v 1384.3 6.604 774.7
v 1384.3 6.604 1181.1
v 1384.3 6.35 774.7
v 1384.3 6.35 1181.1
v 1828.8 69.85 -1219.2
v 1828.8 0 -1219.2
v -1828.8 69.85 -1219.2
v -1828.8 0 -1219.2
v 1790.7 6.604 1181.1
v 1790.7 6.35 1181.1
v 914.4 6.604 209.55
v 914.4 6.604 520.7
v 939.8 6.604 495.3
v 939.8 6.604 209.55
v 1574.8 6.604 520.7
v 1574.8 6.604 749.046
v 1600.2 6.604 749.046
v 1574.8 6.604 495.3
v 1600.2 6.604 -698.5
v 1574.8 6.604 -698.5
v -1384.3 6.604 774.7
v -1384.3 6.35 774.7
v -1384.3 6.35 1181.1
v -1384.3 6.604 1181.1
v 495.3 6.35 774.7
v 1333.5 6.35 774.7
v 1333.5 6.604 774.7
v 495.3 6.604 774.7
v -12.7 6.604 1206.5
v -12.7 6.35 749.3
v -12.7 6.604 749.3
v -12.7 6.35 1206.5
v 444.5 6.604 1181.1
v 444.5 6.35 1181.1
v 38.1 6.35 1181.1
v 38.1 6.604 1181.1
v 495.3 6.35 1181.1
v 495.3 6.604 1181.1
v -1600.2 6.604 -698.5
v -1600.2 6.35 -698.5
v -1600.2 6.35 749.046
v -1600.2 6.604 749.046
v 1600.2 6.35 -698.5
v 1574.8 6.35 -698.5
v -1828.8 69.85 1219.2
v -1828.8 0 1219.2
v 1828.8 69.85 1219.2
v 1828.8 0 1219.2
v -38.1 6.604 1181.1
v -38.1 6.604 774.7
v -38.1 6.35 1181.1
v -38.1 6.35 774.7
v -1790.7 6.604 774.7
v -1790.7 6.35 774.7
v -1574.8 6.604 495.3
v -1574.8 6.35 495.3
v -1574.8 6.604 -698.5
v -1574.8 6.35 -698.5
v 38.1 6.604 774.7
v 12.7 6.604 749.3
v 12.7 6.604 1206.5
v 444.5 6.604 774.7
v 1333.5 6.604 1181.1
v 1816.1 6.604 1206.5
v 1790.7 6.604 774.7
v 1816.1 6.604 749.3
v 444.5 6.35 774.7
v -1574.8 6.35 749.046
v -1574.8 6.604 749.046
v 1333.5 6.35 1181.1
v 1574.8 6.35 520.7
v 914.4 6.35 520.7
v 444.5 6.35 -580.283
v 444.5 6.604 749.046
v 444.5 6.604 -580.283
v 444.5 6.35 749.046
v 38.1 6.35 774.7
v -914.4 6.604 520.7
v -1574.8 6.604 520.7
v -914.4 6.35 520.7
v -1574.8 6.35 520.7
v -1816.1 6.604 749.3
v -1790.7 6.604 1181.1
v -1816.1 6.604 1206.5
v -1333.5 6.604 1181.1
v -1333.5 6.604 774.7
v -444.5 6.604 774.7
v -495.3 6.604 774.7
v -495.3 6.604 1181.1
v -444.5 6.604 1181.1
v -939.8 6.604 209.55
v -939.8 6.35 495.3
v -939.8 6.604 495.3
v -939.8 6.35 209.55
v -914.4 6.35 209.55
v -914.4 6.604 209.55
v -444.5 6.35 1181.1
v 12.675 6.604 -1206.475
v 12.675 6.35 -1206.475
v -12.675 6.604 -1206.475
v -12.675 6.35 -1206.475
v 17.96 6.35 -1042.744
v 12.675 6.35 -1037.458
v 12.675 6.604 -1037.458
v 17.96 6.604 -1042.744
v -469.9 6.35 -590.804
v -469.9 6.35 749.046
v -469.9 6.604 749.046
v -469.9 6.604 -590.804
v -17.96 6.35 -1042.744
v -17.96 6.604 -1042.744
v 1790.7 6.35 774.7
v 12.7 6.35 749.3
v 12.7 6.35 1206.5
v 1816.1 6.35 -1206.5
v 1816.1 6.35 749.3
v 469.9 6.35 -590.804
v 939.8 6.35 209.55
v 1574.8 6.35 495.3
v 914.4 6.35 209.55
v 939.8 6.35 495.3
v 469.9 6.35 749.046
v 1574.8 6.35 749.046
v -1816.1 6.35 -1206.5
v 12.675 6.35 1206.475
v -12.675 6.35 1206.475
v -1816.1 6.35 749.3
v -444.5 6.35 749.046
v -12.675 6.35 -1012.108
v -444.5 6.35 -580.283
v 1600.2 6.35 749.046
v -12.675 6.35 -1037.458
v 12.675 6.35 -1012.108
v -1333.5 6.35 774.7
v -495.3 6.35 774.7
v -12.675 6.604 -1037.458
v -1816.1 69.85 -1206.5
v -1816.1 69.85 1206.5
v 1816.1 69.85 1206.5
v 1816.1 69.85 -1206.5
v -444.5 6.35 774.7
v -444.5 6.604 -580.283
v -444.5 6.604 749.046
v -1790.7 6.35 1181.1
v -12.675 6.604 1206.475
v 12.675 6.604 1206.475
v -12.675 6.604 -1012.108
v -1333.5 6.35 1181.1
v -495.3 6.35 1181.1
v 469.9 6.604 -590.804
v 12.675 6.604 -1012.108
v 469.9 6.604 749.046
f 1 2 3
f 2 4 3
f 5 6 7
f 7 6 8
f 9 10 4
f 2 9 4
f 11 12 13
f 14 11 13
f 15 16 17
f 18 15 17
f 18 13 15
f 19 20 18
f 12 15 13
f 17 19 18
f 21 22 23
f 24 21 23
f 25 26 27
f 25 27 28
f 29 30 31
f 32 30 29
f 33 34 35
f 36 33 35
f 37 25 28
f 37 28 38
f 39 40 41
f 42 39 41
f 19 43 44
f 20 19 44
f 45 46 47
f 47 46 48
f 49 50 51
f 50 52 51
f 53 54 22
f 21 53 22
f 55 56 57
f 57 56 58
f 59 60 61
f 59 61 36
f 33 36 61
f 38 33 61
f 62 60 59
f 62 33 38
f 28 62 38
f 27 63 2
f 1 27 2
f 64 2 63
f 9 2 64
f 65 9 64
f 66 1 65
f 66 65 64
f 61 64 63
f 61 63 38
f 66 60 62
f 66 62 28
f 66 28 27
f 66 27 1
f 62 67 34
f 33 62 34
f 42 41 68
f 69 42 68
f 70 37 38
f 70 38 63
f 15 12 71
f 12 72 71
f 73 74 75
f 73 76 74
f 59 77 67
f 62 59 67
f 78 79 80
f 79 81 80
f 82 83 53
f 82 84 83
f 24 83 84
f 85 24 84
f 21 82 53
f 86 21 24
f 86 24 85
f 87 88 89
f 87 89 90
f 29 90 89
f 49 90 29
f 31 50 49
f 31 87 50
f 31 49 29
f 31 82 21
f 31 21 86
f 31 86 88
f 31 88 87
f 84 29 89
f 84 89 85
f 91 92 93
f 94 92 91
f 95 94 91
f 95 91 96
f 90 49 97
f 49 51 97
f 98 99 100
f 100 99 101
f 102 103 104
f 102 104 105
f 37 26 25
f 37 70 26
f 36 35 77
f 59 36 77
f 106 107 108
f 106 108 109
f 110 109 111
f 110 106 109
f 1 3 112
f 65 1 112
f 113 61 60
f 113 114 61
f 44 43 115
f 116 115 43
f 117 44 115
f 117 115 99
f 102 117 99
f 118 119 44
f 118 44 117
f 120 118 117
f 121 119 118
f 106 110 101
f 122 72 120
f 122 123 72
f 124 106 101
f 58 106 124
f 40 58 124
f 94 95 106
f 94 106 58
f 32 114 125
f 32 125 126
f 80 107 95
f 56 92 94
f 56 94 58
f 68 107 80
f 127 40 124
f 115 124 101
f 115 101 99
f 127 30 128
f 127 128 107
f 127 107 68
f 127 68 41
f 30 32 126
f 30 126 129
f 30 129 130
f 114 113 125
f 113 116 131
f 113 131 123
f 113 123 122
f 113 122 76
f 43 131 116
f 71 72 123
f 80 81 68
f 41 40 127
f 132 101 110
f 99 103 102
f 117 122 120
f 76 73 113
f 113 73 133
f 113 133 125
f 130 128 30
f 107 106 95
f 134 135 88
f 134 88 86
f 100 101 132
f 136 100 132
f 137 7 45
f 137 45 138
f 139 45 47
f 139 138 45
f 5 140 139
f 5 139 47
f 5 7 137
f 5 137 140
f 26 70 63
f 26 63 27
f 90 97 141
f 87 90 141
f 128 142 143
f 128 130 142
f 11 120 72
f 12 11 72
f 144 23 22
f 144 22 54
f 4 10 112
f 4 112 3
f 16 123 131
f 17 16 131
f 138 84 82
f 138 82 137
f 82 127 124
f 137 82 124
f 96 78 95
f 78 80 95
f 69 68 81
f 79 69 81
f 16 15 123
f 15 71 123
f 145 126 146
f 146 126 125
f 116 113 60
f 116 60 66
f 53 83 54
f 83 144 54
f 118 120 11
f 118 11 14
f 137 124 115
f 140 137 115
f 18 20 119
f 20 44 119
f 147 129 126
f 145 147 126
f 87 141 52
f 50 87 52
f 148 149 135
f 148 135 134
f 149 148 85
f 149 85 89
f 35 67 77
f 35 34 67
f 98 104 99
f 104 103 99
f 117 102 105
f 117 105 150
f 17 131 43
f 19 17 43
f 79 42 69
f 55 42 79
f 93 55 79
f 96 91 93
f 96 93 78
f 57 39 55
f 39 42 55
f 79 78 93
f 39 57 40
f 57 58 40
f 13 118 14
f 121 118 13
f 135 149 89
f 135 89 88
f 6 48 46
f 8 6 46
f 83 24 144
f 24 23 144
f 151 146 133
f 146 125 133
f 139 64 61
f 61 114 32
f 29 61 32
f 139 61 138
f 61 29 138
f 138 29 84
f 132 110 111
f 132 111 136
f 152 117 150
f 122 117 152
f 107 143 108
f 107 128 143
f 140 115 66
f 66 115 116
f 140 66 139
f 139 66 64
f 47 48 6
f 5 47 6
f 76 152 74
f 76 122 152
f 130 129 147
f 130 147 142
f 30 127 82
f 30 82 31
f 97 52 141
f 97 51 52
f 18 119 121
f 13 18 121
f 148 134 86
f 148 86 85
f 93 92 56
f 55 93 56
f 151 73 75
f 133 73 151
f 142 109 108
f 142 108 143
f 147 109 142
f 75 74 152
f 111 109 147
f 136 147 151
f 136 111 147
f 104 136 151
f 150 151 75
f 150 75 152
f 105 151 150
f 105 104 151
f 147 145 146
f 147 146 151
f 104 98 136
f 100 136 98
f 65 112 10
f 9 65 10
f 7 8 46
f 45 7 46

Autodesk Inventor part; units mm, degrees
ref_plane "YZ Plane" through (0, 0, 0) normal (1, 0, 0) x (0, 1, 0)
ref_plane "XZ Plane" through (0, 0, 0) normal (0, 1, 0) x (-1, 0, 0)
ref_plane "XY Plane" through (0, 0, 0) normal (0, 0, 1) x (1, 0, 0)
sketch "Sketch1" plane through (0, 0, 0) normal (0, 1, 0) x (-1, 0, 0)
  line L0 (0, -1706.88) -> (0, 1706.88) projected
  line L1 (-2560.32, 0) -> (2560.32, 0) projected
  line L2 (1828.8, 1219.2) -> (-1828.8, 1219.2)
  line L3 (-1828.8, 1219.2) -> (-1828.8, -1219.2)
  line L4 (-1828.8, -1219.2) -> (1828.8, -1219.2)
  line L5 (1828.8, -1219.2) -> (1828.8, 1219.2)
  line L6 (1828.8, 1219.2) -> (-1828.8, -1219.2) construction
  line L7 (-1828.8, 1219.2) -> (1828.8, -1219.2) construction
  point P0 (0, 0)
  dimension "d0" = 2438.4
  dimension "d1" = 3657.6
extrude "Extrusion1" add sketch "Sketch1" along normal blind 6.35
sketch "Sketch2" plane through (0, 6.35, 0) normal (0, 1, 0) x (1, 0, 0)
  line L0 (-1828.8, -1219.2) -> (1828.8, -1219.2) projected
  line L1 (1828.8, -1219.2) -> (1828.8, 1219.2) projected
  line L2 (1828.8, 1219.2) -> (-1828.8, 1219.2) projected
  line L3 (-1828.8, 1219.2) -> (-1828.8, -1219.2) projected
  line L4 (-1816.1, 1206.5) -> (1816.1, 1206.5)
  line L5 (1816.1, 1206.5) -> (1816.1, -1206.5)
  line L6 (1816.1, -1206.5) -> (-1816.1, -1206.5)
  line L7 (-1816.1, -1206.5) -> (-1816.1, 1206.5)
  point P0 (0, 0)
  dimension "d4" = 12.7
extrude "Extrusion2" add sketch "Sketch2" along normal blind 63.5
sketch "Sketch4" plane through (0, 6.35, 0) normal (0, 1, 0) x (1, 0, 0)
  line L0 (1816.1, -1206.5) -> (1816.1, 1206.5) projected
  line L1 (1816.1, 1206.5) -> (-1816.1, 1206.5) projected
  line L2 (-1816.1, 1206.5) -> (-1816.1, -1206.5) projected
  line L3 (-1816.1, -1206.5) -> (1816.1, -1206.5) projected
  line L4 (-1828.8, -1219.2) -> (1828.8, -1219.2) projected
  line L5 (-1828.8, 1219.2) -> (-1828.8, -1219.2) projected
  line L6 (1828.8, 1219.2) -> (-1828.8, 1219.2) projected
  line L7 (1828.8, -1219.2) -> (1828.8, 1219.2) projected
  line L8 (-1816.1, -1206.5) -> (-1358.9, -1206.5)
  line L9 (-1358.9, -1206.5) -> (-1358.9, -749.3)
  line L10 (-1358.9, -749.3) -> (-1816.1, -749.3)
  line L11 (-1816.1, -749.3) -> (-1816.1, -1206.5)
  line L12 (-1790.7, -774.7) -> (-1384.3, -774.7)
  line L13 (-1384.3, -774.7) -> (-1384.3, -1181.1)
  line L14 (-1384.3, -1181.1) -> (-1790.7, -1181.1)
  line L15 (-1790.7, -1181.1) -> (-1790.7, -774.7)
  line L16 (0, 1706.88) -> (0, -1706.88) projected
  line L17 (2560.32, 0) -> (-2560.32, 0) projected
  line L18 (-1358.9, -1206.5) -> (-469.9, -1206.5)
  line L19 (-469.9, -1206.5) -> (-469.9, -749.3)
  line L20 (-469.9, -749.3) -> (-1358.9, -749.3)
  line L21 (-1358.9, -749.3) -> (-1358.9, -1206.5)
  line L22 (-469.9, -749.3) -> (-12.7, -749.3)
  line L23 (-12.7, -749.3) -> (-12.7, -1206.5)
  line L24 (-12.7, -1206.5) -> (-469.9, -1206.5)
  line L25 (-469.9, -1206.5) -> (-469.9, -749.3)
  line L26 (-495.3, -774.7) -> (-1333.5, -774.7)
  line L27 (-1333.5, -774.7) -> (-1333.5, -1181.1)
  line L28 (-1333.5, -1181.1) -> (-495.3, -1181.1)
  line L29 (-495.3, -1181.1) -> (-495.3, -774.7)
  line L30 (-444.5, -774.7) -> (-38.1, -774.7)
  line L31 (-38.1, -774.7) -> (-38.1, -1181.1)
  line L32 (-38.1, -1181.1) -> (-444.5, -1181.1)
  line L33 (-444.5, -1181.1) -> (-444.5, -774.7)
  line L34 (-12.7, -1206.5) -> (0, -1206.5)
  line L35 (0, -1206.5) -> (0, 609.6)
  line L36 (0, 609.6) -> (-12.7, 609.6)
  line L37 (-12.7, 609.6) -> (-12.7, -1206.5)
  line L38 (-1574.8, -749.3) -> (-1600.2, -749.3)
  point P0 (0, 0)
  dimension "d7" = 457.2
  dimension "d8" = 25.4
  dimension "d9" = 889
  dimension "d10" = 457.2
  dimension "d11" = 25.4
  dimension "d12" = 25.4
  dimension "d13" = 609.6
extrude "Extrusion3" add sketch "Sketch4" along normal blind 0.254 contours L3 L19 L22 L23 | L3 L9 L20 L19 | L3 L2 L10 L9
sketch "Sketch7" plane through (0, 6.35, 0) normal (0, 1, 0) x (1, 0, 0)
  line L0 (0, 1706.88) -> (0, -1706.88) projected
  line L1 (2560.32, 0) -> (-2560.32, 0) projected
  line L2 (-1816.1, -749.3) -> (-12.7, -749.3) projected
  line L3 (-12.7, -749.3) -> (-12.7, -1206.5) projected
  line L4 (-12.7, -1206.5) -> (1816.1, -1206.5) projected
  line L5 (1816.1, -1206.5) -> (1816.1, 1206.5) projected
  line L6 (1816.1, 1206.5) -> (-1816.1, 1206.5) projected
  line L7 (-1816.1, 1206.5) -> (-1816.1, -749.3) projected
  line L8 (-469.9, 590.804) -> (-444.5, 590.804)
  line L9 (-444.5, 590.804) -> (-444.5, -749.046)
  line L10 (-444.5, -749.046) -> (-469.9, -749.046)
  line L11 (-469.9, -749.046) -> (-469.9, 590.804)
  line L12 (-469.9, 590.804) -> (-17.9605, 1042.7435)
  line L13 (-17.9605, 1042.7435) -> (0, 1024.783)
  line L14 (-444.5, -1181.1) -> (-444.5, -774.7) projected
  line L15 (0, 1024.783) -> (-444.5, 580.283)
  line L16 (-1600.2, -749.046) -> (-1574.8, -749.046)
  line L17 (-1574.8, -749.046) -> (-1574.8, 698.5)
  line L18 (-1574.8, 698.5) -> (-1600.2, 698.5)
  line L19 (-1600.2, 698.5) -> (-1600.2, -749.046)
  line L20 (-12.7, -749.3) -> (-1816.1, -749.3) projected
  line L21 (-1574.8, -520.7) -> (-914.4, -520.7)
  line L22 (-914.4, -520.7) -> (-914.4, -495.3)
  line L23 (-914.4, -495.3) -> (-1574.8, -495.3)
  line L24 (-1574.8, -495.3) -> (-1574.8, -520.7)
  line L25 (-914.4, -495.3) -> (-939.8, -495.3)
  line L26 (-939.8, -495.3) -> (-939.8, -209.55)
  line L27 (-939.8, -209.55) -> (-914.4, -209.55)
  line L28 (-914.4, -209.55) -> (-914.4, -495.3)
  point P0 (0, 0)
  dimension "d21" = 1339.85
  dimension "d22" = 25.4
  dimension "d23" = 0.254
  dimension "d24" = 135
  dimension "d25" = 508
  dimension "d26" = 0.254
  dimension "d27" = 215.9
  dimension "d28" = 228.6
  dimension "d29" = 285.75
  dimension "d31" = 635
extrude "Extrusion5" add sketch "Sketch7" along normal blind 0.254 contours L15 L9 L8 L12 L13 | L9 L1 L11 L8 | L9 L10 L11 L1 | L19 L18 L17 L1 | L1 L17 L16 L19 | L23 L22 L21 L17 | L26 L27 L28 L23
mirror "Mirror1" about plane through (0, 0, 0) normal (1, 0, 0) of "Extrusion3", "Extrusion5"
sketch "Sketch5" plane through (0, 6.35, 0) normal (0, 1, 0) x (1, 0, 0)
  line L0 (-1384.3, -774.7) -> (-1384.3, -1181.1) projected
  line L1 (-1384.3, -1181.1) -> (-1790.7, -1181.1) projected
  line L2 (-1790.7, -1181.1) -> (-1790.7, -774.7) projected
  line L3 (-1790.7, -774.7) -> (-1384.3, -774.7) projected
  line L4 (-495.3, -774.7) -> (-495.3, -1181.1) projected
  line L5 (-495.3, -1181.1) -> (-1333.5, -1181.1) projected
  line L6 (-1333.5, -1181.1) -> (-1333.5, -774.7) projected
  line L7 (-1333.5, -774.7) -> (-495.3, -774.7) projected
  line L8 (-38.1, -774.7) -> (-38.1, -1181.1) projected
  line L9 (-38.1, -1181.1) -> (-444.5, -1181.1) projected
  line L10 (-444.5, -1181.1) -> (-444.5, -774.7) projected
  line L11 (-444.5, -774.7) -> (-38.1, -774.7) projected
  line L12 (-12.7, -1206.5) -> (-12.7, -749.3) projected
  line L13 (-12.7, -749.3) -> (-1816.1, -749.3) projected
  line L14 (-1816.1, -1206.5) -> (-1816.1, -749.3) projected
  line L15 (-12.7, -1206.5) -> (-1816.1, -1206.5) projected
  line L16 (1384.3, -774.7) -> (1384.3, -1181.1) projected
  line L17 (1790.7, -774.7) -> (1384.3, -774.7) projected
  line L18 (1790.7, -1181.1) -> (1790.7, -774.7) projected
  line L19 (1384.3, -1181.1) -> (1790.7, -1181.1) projected
  line L20 (495.3, -774.7) -> (495.3, -1181.1) projected
  line L21 (1333.5, -774.7) -> (495.3, -774.7) projected
  line L22 (1333.5, -1181.1) -> (1333.5, -774.7) projected
  line L23 (495.3, -1181.1) -> (1333.5, -1181.1) projected
  line L24 (38.1, -774.7) -> (38.1, -1181.1) projected
  line L25 (444.5, -774.7) -> (38.1, -774.7) projected
  line L26 (444.5, -1181.1) -> (444.5, -774.7) projected
  line L27 (38.1, -1181.1) -> (444.5, -1181.1) projected
  line L28 (12.7, -1206.5) -> (12.7, -749.3) projected
  line L29 (1816.1, -1206.5) -> (12.7, -1206.5) projected
  line L30 (1816.1, -749.3) -> (1816.1, -1206.5) projected
  line L31 (12.7, -749.3) -> (1816.1, -749.3) projected
  line L32 (12.7, -749.3) -> (1816.1, -749.3) projected
  line L33 (1816.1, -749.3) -> (1816.1, 1206.5) projected
  line L34 (1816.1, 1206.5) -> (-1816.1, 1206.5) projected
  line L35 (-1816.1, 1206.5) -> (-1816.1, -749.3) projected
  line L36 (-1816.1, -749.3) -> (-12.7, -749.3) projected
  line L37 (-12.7, -749.3) -> (-12.7, -1206.5) projected
  line L38 (-12.7, -1206.5) -> (12.7, -1206.5) projected
  line L39 (12.7, -1206.5) -> (12.7, -749.3) projected
  line L40 (-12.7, -1206.5) -> (12.7, -1206.5)
  line L41 (12.7, -1206.5) -> (12.7, 1206.5)
  line L42 (12.7, 1206.5) -> (-12.7, 1206.5)
  line L43 (-12.7, 1206.5) -> (-12.7, -1206.5)
  line L44 (-12.6746, -1206.4746) -> (12.6746, -1206.4746)
  line L45 (12.6746, -1206.4746) -> (12.6746, 1206.4746)
  line L46 (12.6746, 1206.4746) -> (-12.6746, 1206.4746)
  line L47 (-12.6746, 1206.4746) -> (-12.6746, -1206.4746)
  point P0 (0, 0)
  dimension "d18" = 0.0254
extrude "Extrusion4" add sketch "Sketch5" along normal blind 0.254 contours L47 L46 L45 L44
equation "\"d11\" = d8"
equation "\"d12\" = d11"
properties part number "Field"
